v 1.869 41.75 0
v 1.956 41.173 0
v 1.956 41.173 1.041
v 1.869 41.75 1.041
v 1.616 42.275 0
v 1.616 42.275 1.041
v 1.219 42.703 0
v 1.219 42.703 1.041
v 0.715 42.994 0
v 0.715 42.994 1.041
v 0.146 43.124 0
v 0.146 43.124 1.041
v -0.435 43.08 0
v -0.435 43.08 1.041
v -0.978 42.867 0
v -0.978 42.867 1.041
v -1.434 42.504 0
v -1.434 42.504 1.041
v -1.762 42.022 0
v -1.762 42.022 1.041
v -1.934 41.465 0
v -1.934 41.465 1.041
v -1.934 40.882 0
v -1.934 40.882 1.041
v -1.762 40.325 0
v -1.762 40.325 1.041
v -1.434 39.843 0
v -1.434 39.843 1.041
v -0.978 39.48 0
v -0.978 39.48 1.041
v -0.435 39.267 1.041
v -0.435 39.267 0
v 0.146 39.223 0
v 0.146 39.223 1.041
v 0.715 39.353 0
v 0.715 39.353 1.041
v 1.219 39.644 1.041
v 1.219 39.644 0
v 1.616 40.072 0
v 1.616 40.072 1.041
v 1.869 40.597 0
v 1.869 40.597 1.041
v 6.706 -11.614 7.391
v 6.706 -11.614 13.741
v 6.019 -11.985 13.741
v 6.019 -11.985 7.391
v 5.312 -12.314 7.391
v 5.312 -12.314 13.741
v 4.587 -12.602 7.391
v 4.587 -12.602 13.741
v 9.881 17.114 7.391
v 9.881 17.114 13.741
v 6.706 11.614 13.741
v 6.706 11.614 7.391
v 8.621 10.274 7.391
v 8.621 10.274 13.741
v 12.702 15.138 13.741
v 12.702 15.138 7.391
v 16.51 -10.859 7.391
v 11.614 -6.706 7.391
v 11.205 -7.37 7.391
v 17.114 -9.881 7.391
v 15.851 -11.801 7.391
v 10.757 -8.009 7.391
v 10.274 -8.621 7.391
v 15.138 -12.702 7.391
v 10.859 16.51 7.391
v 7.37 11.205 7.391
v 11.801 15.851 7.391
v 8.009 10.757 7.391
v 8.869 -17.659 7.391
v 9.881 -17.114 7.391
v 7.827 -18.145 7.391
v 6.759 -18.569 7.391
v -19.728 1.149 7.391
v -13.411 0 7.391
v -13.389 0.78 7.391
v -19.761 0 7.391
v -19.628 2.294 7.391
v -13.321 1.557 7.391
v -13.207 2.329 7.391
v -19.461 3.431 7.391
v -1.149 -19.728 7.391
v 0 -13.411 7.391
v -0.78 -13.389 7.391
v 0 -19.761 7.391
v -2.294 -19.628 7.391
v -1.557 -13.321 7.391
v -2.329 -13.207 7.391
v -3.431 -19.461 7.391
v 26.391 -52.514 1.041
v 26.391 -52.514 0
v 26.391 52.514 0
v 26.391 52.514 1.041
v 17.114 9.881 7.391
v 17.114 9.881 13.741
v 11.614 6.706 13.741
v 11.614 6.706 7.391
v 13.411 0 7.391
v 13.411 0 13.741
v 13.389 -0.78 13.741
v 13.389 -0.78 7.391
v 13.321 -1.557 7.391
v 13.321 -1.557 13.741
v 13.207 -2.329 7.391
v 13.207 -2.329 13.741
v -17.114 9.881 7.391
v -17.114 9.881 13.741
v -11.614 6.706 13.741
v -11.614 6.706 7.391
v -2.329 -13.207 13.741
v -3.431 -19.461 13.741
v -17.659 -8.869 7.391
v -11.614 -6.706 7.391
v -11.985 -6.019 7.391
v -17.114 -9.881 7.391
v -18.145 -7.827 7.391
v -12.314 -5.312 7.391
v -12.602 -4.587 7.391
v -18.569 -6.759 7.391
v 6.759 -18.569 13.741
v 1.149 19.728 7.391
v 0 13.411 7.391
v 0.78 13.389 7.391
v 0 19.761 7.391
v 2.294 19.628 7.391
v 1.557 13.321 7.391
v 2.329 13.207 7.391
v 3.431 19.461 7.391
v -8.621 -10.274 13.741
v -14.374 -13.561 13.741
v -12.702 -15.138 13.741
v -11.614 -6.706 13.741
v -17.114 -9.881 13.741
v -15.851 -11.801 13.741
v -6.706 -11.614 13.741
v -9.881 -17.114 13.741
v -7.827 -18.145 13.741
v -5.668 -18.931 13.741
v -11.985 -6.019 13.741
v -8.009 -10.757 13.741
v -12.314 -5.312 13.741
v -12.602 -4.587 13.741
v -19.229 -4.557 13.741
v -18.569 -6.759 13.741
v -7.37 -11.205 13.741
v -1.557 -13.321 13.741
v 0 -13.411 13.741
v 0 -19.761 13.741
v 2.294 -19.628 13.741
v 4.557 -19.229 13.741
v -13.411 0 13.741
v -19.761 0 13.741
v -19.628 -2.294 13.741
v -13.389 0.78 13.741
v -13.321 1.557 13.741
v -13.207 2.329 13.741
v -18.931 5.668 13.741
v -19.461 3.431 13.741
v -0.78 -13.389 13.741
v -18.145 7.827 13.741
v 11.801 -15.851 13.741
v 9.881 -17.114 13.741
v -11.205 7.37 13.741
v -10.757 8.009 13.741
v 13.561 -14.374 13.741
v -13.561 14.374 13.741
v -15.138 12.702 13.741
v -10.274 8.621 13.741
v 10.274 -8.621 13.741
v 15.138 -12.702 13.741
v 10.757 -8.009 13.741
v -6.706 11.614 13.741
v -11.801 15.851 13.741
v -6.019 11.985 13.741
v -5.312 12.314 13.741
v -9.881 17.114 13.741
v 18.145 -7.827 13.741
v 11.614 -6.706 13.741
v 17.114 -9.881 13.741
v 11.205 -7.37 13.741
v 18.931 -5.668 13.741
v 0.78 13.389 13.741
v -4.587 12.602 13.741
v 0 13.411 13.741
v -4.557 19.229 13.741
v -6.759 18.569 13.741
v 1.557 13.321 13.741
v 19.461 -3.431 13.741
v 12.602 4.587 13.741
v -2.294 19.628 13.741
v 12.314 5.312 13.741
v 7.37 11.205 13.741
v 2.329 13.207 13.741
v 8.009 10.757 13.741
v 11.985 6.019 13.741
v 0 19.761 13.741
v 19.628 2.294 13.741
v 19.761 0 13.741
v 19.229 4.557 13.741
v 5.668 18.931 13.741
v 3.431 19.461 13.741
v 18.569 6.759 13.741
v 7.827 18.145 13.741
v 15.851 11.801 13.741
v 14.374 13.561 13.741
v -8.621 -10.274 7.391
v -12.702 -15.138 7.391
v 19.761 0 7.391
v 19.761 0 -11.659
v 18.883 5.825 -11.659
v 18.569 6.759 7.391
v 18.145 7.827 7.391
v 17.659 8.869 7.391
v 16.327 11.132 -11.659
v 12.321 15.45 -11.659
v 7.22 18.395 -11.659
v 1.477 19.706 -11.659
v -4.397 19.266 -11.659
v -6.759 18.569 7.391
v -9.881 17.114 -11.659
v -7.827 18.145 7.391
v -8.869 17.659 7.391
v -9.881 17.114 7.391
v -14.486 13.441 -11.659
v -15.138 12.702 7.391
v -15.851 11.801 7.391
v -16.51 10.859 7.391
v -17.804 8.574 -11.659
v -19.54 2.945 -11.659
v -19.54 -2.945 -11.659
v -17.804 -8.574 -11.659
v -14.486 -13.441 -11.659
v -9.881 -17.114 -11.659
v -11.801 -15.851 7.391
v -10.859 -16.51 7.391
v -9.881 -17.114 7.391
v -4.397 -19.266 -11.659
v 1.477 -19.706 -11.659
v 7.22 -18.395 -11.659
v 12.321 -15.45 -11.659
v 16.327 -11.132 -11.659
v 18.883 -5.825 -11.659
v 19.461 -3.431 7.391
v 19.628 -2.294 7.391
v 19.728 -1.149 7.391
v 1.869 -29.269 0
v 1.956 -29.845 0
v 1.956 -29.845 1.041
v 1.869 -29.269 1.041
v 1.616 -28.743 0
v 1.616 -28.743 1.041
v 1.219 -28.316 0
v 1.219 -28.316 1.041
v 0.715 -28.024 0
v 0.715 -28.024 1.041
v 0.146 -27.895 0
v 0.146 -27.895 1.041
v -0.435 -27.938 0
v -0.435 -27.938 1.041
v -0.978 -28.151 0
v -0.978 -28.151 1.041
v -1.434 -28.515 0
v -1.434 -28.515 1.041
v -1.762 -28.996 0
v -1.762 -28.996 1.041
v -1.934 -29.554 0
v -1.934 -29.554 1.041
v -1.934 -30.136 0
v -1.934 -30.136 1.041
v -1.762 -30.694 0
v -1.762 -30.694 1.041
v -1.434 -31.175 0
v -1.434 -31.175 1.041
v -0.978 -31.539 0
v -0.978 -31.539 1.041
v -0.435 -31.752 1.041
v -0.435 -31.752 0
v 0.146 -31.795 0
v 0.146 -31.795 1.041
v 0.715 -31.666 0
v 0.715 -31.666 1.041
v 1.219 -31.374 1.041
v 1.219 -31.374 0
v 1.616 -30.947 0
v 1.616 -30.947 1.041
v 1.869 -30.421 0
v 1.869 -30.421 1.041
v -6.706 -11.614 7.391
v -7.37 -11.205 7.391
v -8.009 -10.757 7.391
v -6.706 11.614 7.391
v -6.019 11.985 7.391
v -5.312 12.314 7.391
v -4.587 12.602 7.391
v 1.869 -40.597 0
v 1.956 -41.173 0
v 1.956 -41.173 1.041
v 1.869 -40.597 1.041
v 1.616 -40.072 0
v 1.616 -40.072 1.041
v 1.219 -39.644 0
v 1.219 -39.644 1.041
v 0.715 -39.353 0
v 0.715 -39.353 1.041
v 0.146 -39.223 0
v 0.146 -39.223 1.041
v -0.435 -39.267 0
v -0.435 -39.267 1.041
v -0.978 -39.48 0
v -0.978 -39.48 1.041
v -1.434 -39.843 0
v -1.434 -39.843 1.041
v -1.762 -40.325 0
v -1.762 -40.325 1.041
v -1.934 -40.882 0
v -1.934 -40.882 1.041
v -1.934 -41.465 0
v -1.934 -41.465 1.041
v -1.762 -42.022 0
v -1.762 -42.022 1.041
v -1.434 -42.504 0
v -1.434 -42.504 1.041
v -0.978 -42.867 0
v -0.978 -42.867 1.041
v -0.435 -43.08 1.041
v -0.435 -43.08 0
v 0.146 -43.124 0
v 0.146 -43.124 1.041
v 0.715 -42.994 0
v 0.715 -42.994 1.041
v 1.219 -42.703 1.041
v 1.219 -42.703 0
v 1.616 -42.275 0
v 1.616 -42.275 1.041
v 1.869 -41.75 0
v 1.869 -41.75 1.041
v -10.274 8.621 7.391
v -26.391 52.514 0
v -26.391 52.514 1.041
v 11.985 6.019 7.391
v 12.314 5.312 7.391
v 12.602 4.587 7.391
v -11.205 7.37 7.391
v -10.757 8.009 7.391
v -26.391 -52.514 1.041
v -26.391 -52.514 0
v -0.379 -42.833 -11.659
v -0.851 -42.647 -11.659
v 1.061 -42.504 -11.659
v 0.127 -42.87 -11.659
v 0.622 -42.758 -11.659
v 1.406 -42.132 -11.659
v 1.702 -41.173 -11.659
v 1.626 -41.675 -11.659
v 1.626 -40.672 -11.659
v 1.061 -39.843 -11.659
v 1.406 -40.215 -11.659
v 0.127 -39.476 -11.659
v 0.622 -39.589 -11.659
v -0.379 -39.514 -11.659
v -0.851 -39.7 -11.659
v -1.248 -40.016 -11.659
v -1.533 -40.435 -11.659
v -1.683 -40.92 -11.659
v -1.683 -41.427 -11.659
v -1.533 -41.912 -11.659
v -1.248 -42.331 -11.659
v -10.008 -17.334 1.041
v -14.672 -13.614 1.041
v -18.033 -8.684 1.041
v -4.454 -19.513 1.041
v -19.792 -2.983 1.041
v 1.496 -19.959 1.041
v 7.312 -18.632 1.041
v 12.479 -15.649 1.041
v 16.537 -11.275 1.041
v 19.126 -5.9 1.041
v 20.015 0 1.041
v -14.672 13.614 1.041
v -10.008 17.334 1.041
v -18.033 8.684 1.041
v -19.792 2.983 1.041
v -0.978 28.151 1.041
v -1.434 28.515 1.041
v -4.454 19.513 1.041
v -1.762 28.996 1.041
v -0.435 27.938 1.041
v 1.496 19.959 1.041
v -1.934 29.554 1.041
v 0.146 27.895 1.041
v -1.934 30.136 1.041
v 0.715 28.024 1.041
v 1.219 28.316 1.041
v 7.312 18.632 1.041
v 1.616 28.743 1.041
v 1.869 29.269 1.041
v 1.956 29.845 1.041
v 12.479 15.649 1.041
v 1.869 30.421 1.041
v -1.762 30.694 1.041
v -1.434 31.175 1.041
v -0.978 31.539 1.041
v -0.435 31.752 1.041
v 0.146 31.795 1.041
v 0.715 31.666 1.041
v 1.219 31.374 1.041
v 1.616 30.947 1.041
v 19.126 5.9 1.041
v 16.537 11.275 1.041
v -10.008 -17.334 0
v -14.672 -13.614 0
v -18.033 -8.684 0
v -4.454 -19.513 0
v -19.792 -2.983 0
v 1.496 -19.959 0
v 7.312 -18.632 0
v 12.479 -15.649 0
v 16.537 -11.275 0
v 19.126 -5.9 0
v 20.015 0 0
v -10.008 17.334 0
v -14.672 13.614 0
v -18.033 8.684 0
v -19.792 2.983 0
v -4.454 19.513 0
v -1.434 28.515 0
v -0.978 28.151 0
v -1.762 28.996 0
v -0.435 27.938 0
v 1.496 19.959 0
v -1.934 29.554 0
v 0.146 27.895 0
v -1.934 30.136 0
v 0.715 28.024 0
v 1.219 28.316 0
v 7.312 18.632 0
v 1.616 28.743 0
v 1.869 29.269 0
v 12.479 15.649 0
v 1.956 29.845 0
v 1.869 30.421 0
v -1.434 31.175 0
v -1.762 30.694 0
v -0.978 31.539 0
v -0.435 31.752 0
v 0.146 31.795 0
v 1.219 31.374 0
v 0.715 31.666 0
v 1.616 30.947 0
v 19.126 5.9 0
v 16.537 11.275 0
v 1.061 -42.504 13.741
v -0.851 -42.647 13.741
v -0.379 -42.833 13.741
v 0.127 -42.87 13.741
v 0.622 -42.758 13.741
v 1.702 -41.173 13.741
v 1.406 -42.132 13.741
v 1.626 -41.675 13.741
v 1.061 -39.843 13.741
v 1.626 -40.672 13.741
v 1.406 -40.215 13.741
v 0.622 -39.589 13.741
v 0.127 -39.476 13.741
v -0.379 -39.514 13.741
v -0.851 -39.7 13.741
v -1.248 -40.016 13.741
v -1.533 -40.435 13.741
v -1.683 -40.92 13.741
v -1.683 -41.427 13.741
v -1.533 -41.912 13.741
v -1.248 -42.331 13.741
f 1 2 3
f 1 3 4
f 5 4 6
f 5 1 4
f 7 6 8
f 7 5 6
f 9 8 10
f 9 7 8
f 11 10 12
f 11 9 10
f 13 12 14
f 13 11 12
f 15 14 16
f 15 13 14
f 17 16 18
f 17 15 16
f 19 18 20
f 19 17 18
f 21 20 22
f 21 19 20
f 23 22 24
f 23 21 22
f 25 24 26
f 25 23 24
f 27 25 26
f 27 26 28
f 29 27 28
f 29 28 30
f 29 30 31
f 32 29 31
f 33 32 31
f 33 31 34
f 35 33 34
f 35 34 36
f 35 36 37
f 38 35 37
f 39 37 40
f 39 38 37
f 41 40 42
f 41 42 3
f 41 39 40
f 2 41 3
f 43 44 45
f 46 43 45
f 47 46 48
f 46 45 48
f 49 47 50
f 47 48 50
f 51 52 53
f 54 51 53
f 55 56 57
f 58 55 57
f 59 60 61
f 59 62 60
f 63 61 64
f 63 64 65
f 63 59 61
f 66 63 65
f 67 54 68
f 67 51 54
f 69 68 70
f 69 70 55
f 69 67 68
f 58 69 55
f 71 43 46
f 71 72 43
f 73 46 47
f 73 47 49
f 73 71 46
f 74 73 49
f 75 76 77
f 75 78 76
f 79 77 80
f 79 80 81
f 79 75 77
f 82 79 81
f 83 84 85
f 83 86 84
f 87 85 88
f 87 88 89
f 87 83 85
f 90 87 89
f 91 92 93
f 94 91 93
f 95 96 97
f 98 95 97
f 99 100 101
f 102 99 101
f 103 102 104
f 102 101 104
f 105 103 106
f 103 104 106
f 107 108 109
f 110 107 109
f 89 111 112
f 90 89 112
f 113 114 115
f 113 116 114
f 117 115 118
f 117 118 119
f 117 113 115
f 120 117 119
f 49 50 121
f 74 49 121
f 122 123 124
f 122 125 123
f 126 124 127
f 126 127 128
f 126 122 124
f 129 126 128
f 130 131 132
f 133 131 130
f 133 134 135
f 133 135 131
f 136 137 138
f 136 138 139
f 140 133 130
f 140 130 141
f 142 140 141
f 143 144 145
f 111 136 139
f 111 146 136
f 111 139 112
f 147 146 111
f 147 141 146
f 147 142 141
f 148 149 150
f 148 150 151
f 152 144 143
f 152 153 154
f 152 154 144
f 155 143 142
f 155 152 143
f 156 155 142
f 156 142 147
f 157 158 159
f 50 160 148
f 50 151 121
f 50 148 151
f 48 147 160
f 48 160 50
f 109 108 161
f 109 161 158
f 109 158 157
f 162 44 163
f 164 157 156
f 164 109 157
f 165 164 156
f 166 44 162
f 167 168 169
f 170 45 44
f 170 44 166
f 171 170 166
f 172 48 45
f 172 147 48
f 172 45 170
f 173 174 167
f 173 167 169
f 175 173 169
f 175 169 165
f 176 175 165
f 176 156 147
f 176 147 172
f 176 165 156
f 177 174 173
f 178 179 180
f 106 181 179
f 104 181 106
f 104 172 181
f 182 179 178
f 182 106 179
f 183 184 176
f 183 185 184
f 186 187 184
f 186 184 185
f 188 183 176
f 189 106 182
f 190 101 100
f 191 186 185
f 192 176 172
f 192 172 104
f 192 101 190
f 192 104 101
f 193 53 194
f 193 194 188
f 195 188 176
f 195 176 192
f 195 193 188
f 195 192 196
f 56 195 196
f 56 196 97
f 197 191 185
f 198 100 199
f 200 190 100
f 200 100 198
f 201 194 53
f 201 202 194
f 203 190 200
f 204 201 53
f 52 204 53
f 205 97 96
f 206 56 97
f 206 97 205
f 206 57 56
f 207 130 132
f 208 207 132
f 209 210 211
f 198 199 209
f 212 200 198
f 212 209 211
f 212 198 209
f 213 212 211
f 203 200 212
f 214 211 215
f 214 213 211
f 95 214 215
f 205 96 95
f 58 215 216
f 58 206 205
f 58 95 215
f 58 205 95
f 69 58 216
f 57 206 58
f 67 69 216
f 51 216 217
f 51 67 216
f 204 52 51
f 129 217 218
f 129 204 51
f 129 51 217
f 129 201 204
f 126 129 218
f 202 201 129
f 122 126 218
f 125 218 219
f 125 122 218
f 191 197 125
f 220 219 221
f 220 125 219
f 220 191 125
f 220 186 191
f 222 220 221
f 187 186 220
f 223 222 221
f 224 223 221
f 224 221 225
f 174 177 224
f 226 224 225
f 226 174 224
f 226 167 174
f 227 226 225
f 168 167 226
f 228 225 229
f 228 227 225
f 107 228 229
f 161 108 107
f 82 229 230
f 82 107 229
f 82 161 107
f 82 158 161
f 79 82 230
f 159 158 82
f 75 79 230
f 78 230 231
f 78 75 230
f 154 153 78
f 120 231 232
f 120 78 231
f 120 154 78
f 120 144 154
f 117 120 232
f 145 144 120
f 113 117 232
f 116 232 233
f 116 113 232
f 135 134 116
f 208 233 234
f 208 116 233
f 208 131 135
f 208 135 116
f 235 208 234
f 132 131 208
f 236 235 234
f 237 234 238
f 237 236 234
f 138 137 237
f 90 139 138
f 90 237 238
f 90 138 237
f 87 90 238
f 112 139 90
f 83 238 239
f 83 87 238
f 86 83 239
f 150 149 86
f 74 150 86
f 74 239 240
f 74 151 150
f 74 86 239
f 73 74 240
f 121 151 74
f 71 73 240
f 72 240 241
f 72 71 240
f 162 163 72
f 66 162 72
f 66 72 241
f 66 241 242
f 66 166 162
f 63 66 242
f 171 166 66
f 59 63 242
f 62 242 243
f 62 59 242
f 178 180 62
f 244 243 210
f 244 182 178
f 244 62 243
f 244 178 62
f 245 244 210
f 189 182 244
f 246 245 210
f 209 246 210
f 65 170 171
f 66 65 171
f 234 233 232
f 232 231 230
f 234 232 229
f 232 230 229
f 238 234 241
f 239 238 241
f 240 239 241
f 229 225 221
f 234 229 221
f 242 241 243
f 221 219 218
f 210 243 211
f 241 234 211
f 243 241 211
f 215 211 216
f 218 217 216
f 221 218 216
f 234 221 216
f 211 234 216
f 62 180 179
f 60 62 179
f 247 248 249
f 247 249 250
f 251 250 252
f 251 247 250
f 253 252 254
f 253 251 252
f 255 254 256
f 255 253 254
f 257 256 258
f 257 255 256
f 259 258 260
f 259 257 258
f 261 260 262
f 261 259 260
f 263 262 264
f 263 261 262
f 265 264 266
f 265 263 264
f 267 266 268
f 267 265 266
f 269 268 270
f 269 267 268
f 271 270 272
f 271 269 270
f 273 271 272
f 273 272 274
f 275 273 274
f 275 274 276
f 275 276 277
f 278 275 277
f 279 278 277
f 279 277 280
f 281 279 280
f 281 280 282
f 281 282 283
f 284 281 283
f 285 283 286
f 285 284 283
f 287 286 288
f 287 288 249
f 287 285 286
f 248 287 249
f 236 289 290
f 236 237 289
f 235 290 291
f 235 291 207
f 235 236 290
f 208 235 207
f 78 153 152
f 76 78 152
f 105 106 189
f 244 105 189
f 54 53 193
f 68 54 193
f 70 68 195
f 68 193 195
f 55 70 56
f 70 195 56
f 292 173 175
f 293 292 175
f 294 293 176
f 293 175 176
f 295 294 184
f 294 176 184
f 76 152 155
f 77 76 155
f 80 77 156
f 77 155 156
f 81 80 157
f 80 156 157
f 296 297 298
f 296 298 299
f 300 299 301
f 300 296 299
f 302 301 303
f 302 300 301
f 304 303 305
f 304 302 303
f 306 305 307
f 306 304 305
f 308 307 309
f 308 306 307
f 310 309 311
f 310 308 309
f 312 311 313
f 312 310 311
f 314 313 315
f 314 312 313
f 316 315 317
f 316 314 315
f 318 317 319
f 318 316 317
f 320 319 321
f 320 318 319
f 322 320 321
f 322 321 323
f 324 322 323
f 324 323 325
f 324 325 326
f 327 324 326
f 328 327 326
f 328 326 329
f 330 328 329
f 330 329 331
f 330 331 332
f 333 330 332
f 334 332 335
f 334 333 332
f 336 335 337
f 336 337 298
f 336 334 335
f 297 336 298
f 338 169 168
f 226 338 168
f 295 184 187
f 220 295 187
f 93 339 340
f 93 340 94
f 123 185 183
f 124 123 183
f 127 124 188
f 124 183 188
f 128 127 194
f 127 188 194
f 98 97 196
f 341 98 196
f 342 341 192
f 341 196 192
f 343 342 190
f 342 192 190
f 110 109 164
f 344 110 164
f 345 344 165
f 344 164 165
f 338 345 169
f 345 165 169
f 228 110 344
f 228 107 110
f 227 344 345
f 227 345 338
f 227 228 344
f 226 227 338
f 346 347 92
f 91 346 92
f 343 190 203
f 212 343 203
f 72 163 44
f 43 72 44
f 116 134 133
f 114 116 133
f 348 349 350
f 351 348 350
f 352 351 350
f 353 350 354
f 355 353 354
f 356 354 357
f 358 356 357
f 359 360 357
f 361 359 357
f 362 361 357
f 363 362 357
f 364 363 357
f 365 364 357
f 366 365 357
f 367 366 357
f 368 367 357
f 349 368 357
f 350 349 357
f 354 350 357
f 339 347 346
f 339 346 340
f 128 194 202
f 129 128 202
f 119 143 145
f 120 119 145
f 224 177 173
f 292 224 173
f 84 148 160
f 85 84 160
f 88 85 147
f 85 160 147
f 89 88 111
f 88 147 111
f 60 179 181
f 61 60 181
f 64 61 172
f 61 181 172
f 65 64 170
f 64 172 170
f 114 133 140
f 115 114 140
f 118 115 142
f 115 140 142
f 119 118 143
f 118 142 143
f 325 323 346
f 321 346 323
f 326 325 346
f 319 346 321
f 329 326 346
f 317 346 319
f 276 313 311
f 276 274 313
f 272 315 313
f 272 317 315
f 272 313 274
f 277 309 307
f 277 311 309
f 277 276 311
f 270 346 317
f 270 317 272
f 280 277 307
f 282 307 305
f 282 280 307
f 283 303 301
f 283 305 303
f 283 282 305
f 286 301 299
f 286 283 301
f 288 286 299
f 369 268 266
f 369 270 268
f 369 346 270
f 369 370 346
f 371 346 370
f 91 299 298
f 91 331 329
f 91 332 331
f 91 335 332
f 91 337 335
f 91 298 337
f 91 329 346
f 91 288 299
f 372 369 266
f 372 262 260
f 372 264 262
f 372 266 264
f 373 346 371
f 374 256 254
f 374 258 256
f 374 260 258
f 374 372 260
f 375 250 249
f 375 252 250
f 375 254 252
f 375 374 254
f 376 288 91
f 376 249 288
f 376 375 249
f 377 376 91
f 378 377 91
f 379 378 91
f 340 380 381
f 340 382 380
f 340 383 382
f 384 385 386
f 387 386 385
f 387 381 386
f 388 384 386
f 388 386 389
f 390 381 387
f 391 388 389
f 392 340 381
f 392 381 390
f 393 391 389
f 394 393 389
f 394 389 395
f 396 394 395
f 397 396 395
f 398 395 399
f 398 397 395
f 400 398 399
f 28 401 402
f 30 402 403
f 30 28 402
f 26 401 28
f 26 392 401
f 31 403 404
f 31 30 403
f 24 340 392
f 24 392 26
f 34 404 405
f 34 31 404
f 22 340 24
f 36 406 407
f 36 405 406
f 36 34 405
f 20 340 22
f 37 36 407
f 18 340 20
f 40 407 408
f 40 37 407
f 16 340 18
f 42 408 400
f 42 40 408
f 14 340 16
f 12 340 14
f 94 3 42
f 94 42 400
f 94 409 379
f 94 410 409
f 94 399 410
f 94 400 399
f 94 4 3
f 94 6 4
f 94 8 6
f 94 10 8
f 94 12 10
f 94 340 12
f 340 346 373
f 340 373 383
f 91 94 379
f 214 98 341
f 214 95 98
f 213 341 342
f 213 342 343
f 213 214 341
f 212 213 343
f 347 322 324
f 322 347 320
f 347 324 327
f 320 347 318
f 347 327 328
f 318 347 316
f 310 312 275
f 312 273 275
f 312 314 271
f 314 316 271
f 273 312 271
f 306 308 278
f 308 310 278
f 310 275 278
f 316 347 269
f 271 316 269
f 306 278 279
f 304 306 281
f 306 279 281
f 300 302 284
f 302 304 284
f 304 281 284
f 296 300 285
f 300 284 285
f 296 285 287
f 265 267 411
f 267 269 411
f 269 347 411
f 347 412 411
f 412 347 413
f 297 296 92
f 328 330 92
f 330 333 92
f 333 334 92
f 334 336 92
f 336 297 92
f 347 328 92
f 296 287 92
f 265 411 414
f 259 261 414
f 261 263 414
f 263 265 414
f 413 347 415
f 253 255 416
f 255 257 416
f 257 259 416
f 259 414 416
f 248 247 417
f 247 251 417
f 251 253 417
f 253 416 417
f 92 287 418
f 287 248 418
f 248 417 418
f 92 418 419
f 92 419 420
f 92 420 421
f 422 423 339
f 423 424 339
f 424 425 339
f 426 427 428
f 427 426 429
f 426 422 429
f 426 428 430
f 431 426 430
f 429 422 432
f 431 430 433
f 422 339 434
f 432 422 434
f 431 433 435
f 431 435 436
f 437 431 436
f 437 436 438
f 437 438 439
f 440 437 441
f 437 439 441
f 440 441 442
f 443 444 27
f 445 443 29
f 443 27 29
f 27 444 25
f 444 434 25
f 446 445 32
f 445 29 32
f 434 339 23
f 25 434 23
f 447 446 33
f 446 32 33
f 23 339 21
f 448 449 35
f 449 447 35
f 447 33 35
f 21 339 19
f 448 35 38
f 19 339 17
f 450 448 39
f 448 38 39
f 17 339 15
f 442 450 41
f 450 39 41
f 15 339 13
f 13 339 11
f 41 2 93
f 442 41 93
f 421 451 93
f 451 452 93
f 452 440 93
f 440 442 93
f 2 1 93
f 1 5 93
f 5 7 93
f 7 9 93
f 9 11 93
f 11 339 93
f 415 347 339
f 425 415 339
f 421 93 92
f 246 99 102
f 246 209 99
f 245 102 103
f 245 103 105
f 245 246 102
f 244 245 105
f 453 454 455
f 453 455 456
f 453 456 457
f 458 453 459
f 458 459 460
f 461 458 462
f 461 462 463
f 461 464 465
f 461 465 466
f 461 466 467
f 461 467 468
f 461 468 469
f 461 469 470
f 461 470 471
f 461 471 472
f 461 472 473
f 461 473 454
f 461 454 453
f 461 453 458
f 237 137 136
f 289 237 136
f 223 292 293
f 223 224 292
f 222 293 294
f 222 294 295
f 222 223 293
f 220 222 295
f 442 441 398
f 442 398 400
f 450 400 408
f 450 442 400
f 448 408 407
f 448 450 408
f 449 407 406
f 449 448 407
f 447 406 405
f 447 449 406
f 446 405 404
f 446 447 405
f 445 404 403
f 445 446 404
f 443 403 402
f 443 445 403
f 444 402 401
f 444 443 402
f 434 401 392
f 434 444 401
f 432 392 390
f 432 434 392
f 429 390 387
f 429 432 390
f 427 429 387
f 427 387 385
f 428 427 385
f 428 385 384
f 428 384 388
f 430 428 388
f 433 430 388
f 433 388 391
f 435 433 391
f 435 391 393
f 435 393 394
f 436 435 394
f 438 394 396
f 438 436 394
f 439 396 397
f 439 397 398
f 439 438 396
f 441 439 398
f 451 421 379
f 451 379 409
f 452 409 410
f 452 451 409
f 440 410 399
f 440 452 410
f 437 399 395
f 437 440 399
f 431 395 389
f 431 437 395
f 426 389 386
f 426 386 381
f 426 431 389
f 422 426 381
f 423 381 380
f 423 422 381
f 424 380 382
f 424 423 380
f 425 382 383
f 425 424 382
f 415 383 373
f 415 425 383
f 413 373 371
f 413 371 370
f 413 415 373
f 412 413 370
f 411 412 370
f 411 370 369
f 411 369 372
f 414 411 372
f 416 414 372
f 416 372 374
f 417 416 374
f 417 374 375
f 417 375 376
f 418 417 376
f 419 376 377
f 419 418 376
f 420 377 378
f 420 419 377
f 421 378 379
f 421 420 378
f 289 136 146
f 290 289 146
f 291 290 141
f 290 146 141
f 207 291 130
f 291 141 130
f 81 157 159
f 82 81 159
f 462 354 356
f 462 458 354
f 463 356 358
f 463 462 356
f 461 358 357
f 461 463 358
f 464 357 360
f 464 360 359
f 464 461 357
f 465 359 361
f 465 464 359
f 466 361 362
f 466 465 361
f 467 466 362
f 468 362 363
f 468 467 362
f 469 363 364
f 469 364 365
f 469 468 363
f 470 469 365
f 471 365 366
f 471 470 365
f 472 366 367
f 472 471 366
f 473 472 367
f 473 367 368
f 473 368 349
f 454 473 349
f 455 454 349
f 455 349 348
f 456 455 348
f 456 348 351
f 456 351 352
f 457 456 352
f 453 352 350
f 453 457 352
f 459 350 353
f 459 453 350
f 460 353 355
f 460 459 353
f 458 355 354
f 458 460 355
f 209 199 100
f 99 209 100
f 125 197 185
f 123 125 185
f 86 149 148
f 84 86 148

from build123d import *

# Parameters (mm, degrees)
F0_W            = 52.7812
F0_H            = 105.029
F0_R            = 1.9558
F0_R_2          = 20.0152
F1_DEPTH        = 1.0414
F2_R            = 19.7612
F3_DEPTH        = 12.7
F4_R            = 1.7018
F5_DEPTH        = 12.7
F7_DEPTH        = 6.35
F7_COPIES_COUNT = 12


# Not quite as in the source:
# - a pattern or mirror of a feature is missing from the dataset's text; its kind, count and spacing are read off the source's solid


with BuildPart() as f1:
    # F0 (on Top) → F1 (new body)
    with BuildSketch(Plane.XY):
        Rectangle(F0_W, F0_H)
        with Locations((0, -41.1734)):
            Circle(F0_R, mode=Mode.SUBTRACT)
        with Locations((0, -29.845)):
            Circle(F0_R, mode=Mode.SUBTRACT)
        Circle(F0_R_2, mode=Mode.SUBTRACT)
        with Locations((0, 29.845)):
            Circle(F0_R, mode=Mode.SUBTRACT)
        with Locations((0, 41.1734)):
            Circle(F0_R, mode=Mode.SUBTRACT)
    extrude(amount=F1_DEPTH)


with BuildPart() as f3:
    # F2 (on face) → F3 (new body, symmetric)
    with BuildSketch(Plane.XY.offset(1.0414)):
        Circle(F2_R)
    extrude(amount=F3_DEPTH, both=True)

    # F6 (on face) → F7 (cut)
    with BuildSketch(Plane.XY.offset(13.7414)):
        with BuildLine():
            ThreePointArc((0, 13.4112), (1.1688630971, 13.360166335), (2.3288304403, 13.2074537372))
            Line((2.3288304403, 13.2074537372), (3.4314963685, 19.4609829688))
            ThreePointArc((3.4314963685, 19.4609829688), (1.7223020636, 19.6860026679), (0, 19.7612))
            Line((0, 19.7612), (0, 13.4112))
        make_face()
    f7 = extrude(amount=-F7_DEPTH, mode=Mode.SUBTRACT)

    # F7_copies: F7 ×12 about axis
    f7_copies_axis = Axis((0, 0, 0), (0, 0, 1))
    for i in range(1, F7_COPIES_COUNT):
        add(f7.rotate(f7_copies_axis, i * 360 / F7_COPIES_COUNT), mode=Mode.SUBTRACT)


with BuildPart() as f5:
    # F4 (on face) → F5 (new body, symmetric)
    with BuildSketch(Plane.XY.offset(1.0414)):
        with Locations((0, -41.1734)):
            Circle(F4_R)
    extrude(amount=F5_DEPTH, both=True)


solid = Compound([f1.part, f3.part, f5.part])
